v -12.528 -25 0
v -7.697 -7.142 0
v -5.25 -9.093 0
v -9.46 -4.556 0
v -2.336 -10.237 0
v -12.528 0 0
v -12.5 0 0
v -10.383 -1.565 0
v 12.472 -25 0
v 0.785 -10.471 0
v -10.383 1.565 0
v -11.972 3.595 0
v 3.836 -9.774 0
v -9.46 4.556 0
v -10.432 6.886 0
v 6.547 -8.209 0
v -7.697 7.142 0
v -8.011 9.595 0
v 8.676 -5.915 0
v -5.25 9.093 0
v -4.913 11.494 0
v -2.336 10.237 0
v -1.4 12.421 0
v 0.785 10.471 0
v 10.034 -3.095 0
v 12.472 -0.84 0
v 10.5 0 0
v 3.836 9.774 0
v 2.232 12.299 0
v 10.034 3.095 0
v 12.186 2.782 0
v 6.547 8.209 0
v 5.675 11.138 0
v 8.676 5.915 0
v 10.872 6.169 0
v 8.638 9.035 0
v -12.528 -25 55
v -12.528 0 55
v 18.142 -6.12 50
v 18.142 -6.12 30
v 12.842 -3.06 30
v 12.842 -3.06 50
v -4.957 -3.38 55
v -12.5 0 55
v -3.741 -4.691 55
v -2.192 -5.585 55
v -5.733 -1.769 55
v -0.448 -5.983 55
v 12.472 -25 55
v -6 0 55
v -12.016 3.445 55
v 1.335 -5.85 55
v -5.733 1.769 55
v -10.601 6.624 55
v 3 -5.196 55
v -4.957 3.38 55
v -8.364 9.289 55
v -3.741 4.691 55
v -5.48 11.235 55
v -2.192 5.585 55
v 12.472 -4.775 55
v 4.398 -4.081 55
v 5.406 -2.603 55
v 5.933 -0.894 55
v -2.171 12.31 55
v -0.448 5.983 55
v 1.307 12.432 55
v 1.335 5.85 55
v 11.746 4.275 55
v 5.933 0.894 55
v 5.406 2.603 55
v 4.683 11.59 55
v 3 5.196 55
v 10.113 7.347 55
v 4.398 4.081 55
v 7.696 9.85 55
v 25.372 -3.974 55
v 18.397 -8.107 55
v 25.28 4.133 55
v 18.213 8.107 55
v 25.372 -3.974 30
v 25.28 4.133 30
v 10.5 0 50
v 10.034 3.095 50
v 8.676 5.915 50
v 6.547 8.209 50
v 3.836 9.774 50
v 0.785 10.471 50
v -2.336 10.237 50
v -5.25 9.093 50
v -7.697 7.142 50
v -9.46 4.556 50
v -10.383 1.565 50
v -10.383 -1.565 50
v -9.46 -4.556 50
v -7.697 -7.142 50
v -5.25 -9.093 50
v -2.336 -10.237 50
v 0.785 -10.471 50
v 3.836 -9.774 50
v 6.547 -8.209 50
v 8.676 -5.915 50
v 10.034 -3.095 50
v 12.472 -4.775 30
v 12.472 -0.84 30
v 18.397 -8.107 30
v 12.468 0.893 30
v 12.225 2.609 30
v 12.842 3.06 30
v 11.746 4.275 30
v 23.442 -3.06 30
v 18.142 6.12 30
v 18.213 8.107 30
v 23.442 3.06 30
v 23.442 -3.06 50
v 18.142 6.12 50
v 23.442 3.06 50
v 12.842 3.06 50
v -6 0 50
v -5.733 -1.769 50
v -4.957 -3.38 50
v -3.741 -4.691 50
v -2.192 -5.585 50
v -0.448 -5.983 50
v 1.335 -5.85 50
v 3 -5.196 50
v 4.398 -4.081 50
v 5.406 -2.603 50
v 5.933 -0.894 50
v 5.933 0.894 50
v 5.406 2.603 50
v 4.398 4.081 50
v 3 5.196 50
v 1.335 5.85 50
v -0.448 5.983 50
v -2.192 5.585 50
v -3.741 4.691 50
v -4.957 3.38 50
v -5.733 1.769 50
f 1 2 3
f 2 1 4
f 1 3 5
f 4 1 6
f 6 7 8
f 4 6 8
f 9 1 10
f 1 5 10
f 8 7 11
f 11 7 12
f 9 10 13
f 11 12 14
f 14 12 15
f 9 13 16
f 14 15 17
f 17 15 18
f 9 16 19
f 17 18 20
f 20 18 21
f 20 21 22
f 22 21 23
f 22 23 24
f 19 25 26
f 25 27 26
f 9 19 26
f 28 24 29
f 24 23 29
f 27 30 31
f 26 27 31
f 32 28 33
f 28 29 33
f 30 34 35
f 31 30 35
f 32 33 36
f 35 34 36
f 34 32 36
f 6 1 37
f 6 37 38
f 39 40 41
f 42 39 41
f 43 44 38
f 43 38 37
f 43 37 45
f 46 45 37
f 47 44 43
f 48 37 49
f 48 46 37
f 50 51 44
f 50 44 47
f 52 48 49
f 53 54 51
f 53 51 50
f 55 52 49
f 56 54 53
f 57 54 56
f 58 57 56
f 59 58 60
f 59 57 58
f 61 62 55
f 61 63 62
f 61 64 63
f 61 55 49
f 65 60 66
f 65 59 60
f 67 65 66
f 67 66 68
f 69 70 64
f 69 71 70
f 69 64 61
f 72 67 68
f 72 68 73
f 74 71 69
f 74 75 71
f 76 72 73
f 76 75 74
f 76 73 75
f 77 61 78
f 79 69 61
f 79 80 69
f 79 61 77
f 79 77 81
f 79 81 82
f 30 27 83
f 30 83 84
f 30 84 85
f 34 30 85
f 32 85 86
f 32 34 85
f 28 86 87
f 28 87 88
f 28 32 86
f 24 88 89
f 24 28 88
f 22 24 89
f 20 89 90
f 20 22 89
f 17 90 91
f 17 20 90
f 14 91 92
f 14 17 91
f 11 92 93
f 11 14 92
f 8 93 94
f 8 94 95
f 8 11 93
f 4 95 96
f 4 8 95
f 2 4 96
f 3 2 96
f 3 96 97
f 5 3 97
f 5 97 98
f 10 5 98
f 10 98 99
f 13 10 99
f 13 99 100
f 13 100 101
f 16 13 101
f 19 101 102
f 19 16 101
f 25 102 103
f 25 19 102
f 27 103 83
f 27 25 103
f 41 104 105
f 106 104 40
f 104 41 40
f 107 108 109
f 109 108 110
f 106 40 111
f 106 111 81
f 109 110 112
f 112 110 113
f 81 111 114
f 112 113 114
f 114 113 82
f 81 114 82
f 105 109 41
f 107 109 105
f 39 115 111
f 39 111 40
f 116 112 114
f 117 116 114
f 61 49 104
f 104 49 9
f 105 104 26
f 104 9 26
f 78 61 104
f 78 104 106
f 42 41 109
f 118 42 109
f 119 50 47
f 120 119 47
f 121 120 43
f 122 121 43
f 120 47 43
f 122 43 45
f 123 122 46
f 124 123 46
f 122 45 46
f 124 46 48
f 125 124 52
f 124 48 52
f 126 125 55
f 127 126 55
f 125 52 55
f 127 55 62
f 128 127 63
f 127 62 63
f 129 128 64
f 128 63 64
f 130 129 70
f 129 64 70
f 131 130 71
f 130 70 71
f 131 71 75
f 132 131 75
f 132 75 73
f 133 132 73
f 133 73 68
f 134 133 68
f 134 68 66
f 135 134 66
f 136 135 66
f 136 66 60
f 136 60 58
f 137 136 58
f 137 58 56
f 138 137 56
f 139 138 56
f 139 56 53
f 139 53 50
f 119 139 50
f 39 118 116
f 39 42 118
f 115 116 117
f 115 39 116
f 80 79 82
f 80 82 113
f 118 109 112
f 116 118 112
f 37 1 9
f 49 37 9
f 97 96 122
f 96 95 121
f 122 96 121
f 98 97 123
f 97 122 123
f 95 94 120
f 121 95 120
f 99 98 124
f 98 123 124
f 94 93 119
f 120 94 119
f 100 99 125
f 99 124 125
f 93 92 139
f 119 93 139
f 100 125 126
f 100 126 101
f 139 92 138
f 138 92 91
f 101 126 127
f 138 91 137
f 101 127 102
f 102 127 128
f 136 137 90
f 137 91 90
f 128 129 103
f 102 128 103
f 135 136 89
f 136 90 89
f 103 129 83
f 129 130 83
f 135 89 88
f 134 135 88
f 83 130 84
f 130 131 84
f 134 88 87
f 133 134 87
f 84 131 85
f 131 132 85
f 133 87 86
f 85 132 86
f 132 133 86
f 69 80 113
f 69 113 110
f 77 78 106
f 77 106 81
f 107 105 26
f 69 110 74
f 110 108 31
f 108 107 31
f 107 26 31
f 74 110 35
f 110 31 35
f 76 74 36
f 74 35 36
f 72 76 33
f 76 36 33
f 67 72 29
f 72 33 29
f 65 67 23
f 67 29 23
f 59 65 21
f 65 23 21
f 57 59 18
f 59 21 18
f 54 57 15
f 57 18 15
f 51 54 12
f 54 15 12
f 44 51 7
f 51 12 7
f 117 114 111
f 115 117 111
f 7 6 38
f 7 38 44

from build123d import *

# Parameters (mm, degrees)
F7_R     = 12.5
F0_DEPTH = 55
F1_W     = 25
F1_H     = 25
F8_DEPTH = 55
F2_D     = 12
F10_R    = 10.5
F3_DEPTH = 50
F5_DEPTH = 25
F6_DEPTH = 20


with BuildPart() as f0:
    # F7 (on Top) → F0 (new body)
    with BuildSketch(Plane.XY):
        Circle(F7_R)
    extrude(amount=F0_DEPTH)

    # F1 (on Top) → F8 (join)
    with BuildSketch(Plane.XY):
        with Locations((-0.0282753837, -12.5)):
            Rectangle(F1_W, F1_H)
    extrude(amount=F8_DEPTH)

    # F2 (through all)
    with Locations(Plane(origin=(0, 0, 0), x_dir=(1, 0, 0), z_dir=(0, 0, -1))):
        with Locations((0, 0)):
            Hole(F2_D / 2)

    # F10 (on Top) → F3 (cut)
    with BuildSketch(Plane.XY):
        Circle(F10_R)
    extrude(amount=F3_DEPTH, mode=Mode.SUBTRACT)

    # F11 (on face) → F5 (join)
    with BuildSketch(Plane.XY.offset(55)):
        with BuildLine():
            Line((12.4717246163, -4.7753756192), (18.3970628421, -8.107226411))
            Line((18.3970628421, -8.107226411), (25.3720879555, -3.9738714695))
            Line((25.3720879555, -3.9738714695), (25.28001013, 4.1333549415))
            Line((25.28001013, 4.1333549415), (18.2129071911, 8.107226411))
            Line((18.2129071911, 8.107226411), (11.7462114787, 4.2751041973))
            ThreePointArc((11.7462114787, 4.2751041973), (12.3761431106, 1.7553010303), (12.4717246163, -0.8402886979))
            Line((12.4717246163, -0.8402886979), (12.4717246163, -4.7753756192))
        make_face()
    extrude(amount=-F5_DEPTH)

    # F12 (on face) → F6 (cut)
    with BuildSketch(Plane(origin=(0, 0, 30), x_dir=(1, 0, 0), z_dir=(0, 0, -1))):
        Polygon((12.8416223451, -3.0601453381), (18.1419495493, -6.1202906762), (23.4422767535, -3.0601453381), (23.4422767535, 3.0601453381), (18.1419495493, 6.1202906762), (12.8416223451, 3.0601453381), align=None)
    extrude(amount=-F6_DEPTH, mode=Mode.SUBTRACT)


solid = f0.part
